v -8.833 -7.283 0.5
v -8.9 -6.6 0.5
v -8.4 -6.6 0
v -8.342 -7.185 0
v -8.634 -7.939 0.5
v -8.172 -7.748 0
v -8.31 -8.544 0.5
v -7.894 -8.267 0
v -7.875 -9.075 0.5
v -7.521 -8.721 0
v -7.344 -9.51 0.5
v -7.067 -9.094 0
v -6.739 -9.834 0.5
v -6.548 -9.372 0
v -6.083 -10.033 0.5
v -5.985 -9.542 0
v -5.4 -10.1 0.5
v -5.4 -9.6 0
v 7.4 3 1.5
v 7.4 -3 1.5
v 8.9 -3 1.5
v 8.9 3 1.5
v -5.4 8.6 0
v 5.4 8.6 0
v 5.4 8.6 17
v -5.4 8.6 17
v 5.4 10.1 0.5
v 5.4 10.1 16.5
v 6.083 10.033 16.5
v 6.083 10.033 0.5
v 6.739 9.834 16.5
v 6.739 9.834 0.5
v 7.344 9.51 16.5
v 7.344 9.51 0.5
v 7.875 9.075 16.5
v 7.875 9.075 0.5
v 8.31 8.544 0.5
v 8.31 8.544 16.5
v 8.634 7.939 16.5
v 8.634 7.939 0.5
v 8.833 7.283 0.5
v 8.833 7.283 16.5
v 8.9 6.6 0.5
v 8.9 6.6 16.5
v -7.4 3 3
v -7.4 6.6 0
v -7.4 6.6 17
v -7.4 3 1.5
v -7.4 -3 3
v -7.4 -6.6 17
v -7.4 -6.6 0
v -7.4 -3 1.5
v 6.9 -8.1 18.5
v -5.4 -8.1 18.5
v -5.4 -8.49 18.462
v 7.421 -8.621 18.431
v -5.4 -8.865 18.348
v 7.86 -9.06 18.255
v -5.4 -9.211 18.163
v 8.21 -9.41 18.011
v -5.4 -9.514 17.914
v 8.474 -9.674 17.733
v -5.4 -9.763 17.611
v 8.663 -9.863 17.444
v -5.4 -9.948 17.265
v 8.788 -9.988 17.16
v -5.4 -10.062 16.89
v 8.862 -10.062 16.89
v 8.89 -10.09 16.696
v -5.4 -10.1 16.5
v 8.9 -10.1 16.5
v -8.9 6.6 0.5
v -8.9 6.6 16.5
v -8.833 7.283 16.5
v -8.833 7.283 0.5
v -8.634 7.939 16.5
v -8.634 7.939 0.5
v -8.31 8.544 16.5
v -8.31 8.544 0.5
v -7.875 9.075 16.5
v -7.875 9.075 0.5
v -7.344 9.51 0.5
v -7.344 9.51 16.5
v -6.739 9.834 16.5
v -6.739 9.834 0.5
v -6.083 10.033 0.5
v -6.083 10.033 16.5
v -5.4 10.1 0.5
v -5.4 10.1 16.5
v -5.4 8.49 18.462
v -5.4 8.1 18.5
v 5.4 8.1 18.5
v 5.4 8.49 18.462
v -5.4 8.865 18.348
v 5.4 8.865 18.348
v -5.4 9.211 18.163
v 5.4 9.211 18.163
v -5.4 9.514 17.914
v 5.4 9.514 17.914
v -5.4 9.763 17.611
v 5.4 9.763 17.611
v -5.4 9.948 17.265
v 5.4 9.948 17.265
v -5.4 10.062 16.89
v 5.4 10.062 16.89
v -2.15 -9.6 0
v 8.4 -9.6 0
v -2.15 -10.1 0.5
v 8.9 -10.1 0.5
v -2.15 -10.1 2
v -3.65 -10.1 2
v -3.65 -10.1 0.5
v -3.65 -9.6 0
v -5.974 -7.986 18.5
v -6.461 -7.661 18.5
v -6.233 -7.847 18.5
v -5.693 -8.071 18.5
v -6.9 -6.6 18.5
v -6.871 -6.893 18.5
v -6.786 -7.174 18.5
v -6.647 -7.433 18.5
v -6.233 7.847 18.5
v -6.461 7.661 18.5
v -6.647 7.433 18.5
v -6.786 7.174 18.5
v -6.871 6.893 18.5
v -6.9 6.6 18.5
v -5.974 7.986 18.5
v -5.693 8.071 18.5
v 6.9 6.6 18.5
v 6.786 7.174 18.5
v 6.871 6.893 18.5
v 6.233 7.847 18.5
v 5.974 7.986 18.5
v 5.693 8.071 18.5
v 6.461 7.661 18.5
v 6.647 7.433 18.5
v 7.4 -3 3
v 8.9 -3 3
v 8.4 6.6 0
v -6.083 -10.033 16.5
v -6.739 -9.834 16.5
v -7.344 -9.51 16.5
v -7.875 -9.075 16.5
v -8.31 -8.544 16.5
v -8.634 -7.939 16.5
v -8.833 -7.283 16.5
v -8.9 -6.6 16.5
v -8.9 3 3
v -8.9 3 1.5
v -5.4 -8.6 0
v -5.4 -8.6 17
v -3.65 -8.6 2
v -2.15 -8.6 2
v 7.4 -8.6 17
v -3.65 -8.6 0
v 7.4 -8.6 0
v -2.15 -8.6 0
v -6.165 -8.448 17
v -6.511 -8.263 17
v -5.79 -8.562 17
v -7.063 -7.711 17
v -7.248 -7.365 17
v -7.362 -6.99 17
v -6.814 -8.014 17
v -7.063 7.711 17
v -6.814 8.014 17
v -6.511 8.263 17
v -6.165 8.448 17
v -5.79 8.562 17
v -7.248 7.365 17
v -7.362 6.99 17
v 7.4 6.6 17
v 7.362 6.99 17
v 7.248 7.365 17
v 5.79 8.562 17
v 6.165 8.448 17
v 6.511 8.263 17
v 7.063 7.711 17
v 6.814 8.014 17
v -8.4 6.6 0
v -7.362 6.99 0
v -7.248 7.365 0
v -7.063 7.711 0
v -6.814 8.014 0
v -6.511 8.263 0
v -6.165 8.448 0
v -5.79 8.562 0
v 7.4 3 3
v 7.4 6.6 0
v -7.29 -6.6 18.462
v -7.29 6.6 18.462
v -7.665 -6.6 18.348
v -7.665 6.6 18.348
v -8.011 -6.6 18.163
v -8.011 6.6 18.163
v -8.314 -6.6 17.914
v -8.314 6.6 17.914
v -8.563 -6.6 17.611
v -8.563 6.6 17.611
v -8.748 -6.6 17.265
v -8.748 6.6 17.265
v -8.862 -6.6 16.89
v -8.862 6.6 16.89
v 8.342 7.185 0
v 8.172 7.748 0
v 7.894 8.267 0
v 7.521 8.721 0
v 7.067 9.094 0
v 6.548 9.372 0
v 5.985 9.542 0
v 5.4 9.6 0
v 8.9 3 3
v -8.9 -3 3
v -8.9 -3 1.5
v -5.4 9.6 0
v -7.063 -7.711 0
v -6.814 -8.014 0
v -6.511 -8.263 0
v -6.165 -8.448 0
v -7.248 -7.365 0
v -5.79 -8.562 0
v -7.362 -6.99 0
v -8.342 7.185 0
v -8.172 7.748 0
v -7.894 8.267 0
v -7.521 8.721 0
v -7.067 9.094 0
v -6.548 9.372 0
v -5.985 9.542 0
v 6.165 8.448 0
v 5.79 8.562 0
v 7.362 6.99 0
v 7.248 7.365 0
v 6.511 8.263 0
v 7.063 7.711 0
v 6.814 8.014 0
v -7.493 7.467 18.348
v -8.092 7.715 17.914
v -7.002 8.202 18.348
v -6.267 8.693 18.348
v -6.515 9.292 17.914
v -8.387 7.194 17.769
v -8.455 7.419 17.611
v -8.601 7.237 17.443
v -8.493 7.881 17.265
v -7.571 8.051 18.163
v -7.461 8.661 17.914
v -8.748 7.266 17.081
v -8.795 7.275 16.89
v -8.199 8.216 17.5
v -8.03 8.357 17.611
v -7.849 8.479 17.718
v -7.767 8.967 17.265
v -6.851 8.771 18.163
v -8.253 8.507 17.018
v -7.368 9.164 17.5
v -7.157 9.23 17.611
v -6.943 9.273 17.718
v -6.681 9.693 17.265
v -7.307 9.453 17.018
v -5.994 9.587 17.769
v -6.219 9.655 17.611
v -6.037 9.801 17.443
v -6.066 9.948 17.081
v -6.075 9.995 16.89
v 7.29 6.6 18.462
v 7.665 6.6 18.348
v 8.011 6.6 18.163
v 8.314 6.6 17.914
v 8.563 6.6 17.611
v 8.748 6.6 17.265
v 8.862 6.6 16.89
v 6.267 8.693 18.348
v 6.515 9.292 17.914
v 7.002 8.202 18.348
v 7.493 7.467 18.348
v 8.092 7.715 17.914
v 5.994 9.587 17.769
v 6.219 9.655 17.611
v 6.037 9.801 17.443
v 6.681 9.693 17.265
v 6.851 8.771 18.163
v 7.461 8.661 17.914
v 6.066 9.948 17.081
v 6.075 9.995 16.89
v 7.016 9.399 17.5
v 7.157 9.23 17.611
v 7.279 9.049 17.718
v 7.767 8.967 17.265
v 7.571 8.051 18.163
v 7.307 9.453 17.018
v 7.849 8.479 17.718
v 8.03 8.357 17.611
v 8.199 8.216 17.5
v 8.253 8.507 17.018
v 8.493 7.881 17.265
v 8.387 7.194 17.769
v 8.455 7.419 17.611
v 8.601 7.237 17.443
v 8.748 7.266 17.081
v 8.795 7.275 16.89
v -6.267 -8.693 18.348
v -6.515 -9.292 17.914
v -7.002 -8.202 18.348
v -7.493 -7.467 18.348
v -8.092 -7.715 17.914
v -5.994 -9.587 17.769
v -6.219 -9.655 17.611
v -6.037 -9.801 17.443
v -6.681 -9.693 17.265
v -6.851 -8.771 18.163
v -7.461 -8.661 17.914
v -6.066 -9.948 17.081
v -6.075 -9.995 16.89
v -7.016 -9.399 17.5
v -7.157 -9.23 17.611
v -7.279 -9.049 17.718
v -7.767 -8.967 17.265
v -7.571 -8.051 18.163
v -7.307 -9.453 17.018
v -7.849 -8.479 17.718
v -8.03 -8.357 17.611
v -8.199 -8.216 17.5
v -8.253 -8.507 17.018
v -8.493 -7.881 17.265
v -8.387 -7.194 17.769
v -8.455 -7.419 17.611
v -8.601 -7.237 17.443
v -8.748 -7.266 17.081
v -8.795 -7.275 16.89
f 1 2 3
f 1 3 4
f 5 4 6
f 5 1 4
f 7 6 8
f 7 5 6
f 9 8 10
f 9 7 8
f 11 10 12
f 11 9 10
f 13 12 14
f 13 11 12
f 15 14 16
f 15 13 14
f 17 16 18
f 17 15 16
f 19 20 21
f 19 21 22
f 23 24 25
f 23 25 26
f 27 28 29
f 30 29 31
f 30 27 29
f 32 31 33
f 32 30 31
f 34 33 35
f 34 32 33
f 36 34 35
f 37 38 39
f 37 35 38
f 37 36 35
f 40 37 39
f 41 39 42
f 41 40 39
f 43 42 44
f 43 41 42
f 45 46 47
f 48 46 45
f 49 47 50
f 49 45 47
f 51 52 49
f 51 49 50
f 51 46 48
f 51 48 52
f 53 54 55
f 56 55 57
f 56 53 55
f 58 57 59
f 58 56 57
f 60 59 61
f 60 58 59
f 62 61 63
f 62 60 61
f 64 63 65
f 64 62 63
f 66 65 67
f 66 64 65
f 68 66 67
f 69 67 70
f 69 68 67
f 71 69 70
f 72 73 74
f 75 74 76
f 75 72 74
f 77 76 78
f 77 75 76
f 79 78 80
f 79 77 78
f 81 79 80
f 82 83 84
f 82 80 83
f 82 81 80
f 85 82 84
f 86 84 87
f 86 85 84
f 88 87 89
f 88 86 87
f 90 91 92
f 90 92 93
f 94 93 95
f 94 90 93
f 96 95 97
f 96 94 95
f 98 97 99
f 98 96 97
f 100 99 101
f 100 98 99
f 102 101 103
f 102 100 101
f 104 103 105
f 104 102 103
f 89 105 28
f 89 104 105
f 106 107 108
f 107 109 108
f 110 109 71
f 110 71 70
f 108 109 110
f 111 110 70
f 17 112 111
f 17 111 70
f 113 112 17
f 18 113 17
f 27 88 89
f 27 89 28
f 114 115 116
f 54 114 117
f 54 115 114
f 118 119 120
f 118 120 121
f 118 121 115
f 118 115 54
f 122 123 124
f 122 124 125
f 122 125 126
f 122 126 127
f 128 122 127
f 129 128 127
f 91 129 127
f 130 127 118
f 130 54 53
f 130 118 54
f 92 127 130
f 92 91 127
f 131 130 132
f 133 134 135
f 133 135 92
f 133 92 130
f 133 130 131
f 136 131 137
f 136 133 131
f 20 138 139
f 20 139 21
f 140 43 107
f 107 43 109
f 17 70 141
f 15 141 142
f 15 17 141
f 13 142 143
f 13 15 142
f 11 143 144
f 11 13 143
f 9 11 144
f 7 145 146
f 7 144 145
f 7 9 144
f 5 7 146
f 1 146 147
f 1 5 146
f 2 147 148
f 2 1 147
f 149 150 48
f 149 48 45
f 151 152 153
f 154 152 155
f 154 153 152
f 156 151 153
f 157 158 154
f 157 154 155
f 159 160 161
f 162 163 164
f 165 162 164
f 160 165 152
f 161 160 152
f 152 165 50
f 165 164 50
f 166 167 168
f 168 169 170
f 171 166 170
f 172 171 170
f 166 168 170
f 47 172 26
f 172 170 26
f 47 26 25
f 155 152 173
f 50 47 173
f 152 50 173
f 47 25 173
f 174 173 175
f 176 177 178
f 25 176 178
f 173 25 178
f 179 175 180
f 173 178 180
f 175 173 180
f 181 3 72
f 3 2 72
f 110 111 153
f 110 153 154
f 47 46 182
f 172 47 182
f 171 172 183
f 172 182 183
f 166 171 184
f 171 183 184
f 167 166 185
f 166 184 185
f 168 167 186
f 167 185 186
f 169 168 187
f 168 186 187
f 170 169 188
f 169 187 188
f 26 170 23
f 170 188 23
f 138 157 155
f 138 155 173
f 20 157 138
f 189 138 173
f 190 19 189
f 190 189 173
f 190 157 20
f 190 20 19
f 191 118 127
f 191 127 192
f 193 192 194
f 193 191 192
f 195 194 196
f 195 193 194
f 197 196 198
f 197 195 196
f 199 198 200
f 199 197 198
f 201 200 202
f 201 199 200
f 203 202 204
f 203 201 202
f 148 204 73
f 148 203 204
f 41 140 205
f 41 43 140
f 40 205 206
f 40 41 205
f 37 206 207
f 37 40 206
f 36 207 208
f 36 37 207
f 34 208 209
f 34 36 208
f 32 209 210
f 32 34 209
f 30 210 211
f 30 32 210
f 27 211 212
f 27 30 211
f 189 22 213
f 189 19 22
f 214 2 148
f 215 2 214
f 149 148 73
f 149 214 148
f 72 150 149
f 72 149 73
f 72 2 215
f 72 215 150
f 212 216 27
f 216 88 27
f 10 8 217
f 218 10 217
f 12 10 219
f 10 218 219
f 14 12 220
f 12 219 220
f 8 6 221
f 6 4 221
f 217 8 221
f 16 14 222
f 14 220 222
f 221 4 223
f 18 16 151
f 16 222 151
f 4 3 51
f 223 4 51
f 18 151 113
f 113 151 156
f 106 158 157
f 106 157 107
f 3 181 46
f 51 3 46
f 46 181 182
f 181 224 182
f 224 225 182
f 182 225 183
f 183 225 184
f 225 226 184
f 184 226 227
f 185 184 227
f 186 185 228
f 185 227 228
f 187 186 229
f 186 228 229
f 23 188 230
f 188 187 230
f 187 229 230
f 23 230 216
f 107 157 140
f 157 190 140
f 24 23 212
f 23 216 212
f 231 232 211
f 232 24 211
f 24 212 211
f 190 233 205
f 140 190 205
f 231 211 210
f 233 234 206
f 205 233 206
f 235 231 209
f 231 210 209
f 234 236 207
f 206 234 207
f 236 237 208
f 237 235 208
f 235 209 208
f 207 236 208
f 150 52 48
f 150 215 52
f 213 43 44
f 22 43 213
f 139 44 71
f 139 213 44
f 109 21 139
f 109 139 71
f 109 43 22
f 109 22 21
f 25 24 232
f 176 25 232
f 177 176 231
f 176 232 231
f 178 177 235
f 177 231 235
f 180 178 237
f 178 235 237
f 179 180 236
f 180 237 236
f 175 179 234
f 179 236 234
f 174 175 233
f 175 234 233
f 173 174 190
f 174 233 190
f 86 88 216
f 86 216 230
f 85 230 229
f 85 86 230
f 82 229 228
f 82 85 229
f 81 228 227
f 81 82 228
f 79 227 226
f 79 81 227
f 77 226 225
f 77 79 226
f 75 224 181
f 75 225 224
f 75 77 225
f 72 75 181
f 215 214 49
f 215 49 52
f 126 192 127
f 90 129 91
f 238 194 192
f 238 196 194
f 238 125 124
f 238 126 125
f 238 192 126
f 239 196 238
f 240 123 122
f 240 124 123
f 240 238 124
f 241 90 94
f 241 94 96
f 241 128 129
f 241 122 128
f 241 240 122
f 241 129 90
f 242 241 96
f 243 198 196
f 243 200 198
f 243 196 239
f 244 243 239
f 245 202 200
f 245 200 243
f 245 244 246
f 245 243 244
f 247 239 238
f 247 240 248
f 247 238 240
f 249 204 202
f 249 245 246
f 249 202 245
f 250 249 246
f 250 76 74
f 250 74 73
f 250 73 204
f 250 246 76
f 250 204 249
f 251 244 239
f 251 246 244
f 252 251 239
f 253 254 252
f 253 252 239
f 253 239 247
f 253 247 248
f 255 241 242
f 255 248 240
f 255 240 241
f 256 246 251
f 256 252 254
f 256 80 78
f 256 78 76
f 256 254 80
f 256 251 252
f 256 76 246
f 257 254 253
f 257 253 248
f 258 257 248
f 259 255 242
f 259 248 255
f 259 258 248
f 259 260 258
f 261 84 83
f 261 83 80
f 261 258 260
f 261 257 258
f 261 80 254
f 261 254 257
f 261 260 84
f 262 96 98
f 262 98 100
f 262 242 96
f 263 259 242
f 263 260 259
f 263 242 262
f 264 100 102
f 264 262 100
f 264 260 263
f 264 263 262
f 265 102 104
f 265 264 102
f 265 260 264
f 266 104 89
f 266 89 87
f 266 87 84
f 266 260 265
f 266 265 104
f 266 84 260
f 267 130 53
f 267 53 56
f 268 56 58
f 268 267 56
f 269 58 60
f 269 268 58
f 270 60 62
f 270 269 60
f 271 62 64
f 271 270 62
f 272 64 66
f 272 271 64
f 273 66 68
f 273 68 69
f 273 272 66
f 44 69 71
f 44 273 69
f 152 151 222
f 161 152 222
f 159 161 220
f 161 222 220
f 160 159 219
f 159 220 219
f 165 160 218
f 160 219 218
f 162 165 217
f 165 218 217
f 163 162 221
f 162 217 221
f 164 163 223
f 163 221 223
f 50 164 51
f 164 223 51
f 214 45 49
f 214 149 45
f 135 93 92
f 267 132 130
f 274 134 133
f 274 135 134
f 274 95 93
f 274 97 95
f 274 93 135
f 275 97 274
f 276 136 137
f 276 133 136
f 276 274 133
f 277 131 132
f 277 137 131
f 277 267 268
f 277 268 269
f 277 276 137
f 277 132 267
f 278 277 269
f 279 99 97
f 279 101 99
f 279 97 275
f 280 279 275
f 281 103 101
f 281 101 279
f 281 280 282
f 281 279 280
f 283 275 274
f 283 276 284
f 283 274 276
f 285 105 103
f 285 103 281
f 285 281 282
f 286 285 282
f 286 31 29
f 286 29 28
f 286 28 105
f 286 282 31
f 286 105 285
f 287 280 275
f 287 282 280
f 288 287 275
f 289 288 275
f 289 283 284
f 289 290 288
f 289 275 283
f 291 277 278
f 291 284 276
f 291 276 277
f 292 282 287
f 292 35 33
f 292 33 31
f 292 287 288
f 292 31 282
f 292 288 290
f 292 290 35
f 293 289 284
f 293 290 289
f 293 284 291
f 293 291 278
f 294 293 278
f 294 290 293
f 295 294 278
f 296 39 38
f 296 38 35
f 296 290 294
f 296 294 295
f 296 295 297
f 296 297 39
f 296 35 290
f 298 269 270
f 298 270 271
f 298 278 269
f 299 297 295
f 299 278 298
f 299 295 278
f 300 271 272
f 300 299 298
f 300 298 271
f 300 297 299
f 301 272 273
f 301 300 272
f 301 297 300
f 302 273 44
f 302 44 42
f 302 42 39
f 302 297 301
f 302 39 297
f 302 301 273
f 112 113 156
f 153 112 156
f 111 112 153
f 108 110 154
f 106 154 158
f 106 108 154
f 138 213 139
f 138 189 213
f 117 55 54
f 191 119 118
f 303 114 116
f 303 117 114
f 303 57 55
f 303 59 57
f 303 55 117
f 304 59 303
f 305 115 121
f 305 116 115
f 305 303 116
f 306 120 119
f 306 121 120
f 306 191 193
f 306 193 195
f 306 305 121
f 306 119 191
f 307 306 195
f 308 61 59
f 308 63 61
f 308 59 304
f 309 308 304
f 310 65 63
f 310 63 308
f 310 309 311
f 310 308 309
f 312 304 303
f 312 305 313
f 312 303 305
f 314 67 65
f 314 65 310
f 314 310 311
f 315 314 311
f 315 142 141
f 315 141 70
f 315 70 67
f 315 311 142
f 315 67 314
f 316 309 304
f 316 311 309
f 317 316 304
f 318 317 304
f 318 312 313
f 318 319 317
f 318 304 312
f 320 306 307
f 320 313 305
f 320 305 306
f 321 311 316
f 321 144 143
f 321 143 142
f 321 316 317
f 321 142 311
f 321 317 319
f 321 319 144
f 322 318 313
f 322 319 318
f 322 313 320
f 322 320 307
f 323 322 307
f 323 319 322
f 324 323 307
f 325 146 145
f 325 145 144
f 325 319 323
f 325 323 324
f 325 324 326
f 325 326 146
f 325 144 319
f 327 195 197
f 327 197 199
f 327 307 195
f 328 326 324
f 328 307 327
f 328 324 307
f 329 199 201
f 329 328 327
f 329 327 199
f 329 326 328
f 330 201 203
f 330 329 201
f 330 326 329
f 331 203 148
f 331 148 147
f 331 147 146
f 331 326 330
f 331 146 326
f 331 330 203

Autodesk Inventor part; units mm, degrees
ref_plane "YZ Plane" through (0, 0, 0) normal (1, 0, 0) x (0, 1, 0)
ref_plane "XZ Plane" through (0, 0, 0) normal (0, 1, 0) x (-1, 0, 0)
ref_plane "XY Plane" through (0, 0, 0) normal (0, 0, 1) x (1, 0, 0)
sketch "스케치1" plane through (0, 0, 0) normal (0, 0, 1) x (1, 0, 0)
  line L0 (-5.4, -8.6) -> (7.4, -8.6)
  line L1 (7.4, -8.6) -> (7.4, 6.6)
  line L2 (5.4, 8.6) -> (-5.4, 8.6)
  line L3 (-7.4, 6.6) -> (-7.4, -6.6)
  line L4 (-7.4, -8.6) -> (7.4, 8.6) construction
  line L5 (7.4, -8.6) -> (-7.4, 8.6) construction
  arc A0 (-5.4, 8.6) -> (-7.4, 6.6) centre (-5.4, 6.6) ccw
  arc A1 (7.4, 6.6) -> (5.4, 8.6) centre (5.4, 6.6) ccw
  arc A2 (-7.4, -6.6) -> (-5.4, -8.6) centre (-5.4, -6.6) ccw
  line L6 (-5.4, 10.1) -> (5.4, 10.1)
  arc A3 (8.9, 6.6) -> (5.4, 10.1) centre (5.4, 6.6) ccw
  line L7 (8.9, 6.6) -> (8.9, -10.1)
  line L8 (8.9, -10.1) -> (-5.4, -10.1)
  arc A4 (-8.9, -6.6) -> (-5.4, -10.1) centre (-5.4, -6.6) ccw
  line L9 (-8.9, -6.6) -> (-8.9, 6.6)
  arc A5 (-5.4, 10.1) -> (-8.9, 6.6) centre (-5.4, 6.6) ccw
  point P0 (0, 0)
  dimension "d0" = 17.2
  dimension "d1" = 14.8
  dimension "d2" = 2
  dimension "d3" = 1.5
extrude "돌출1" add sketch "스케치1" along normal blind 17
sketch "스케치2" plane through (0, 0, 17) normal (0, 0, 1) x (1, 0, 0)
  line L0 (-5.4, -10.1) -> (8.9, -10.1) projected
  line L1 (8.9, -10.1) -> (8.9, 6.6) projected
  arc A0 (8.9, 6.6) -> (5.4, 10.1) centre (5.4, 6.6) ccw projected
  line L2 (5.4, 10.1) -> (-5.4, 10.1) projected
  arc A1 (-5.4, 10.1) -> (-8.9, 6.6) centre (-5.4, 6.6) ccw projected
  line L3 (-8.9, 6.6) -> (-8.9, -6.6) projected
  arc A2 (-8.9, -6.6) -> (-5.4, -10.1) centre (-5.4, -6.6) ccw projected
  point P0 (0, 0)
extrude "돌출2" add sketch "스케치2" along normal blind 1.5
sketch "스케치3" plane through (-8.9, -6.6, 0) normal (-1, 0, 0) x (0, 0, 1)
  line L0 (0, 13.2) -> (0, 0) projected
  line L1 (3, 3.6) -> (1.5, 3.6)
  line L2 (1.5, 3.6) -> (1.5, 9.6)
  line L3 (1.5, 9.6) -> (3, 9.6)
  line L4 (3, 9.6) -> (3, 3.6)
  point P0 (0, 6.6)
  point P1 (0, 6.6)
  point P2 (1.5, 6.6)
  dimension "d8" = 6
  dimension "d9" = 1.5
  dimension "d10" = 1.5
extrude "돌출3" cut sketch "스케치3" against normal through all
fillet "모깎기1" radius 2 7 edges at (-7.8749, -9.0749, 18.5) (1.75, -10.1, 18.5) (-7.8749, 9.0749, 18.5) (0, 10.1, 18.5) (7.8749, 9.0749, 18.5) (8.9, -1.75, 18.5) (-8.9, 0, 18.5)
chamfer "모따기1" distance 0.5 angle 45 7 edges at (1.75, -10.1, 0) (-7.8749, -9.0749, 0) (-8.9, 0, 0) (-7.8749, 9.0749, 0) (0, 10.1, 0) (7.8749, 9.0749, 0) (8.9, -1.75, 0)
sketch "스케치4" plane through (-5.4, -10.1, 16.5) normal (0, -1, 0) x (1, 0, 0)
  line L0 (1.75, -14.5) -> (3.25, -14.5)
  line L1 (3.25, -14.5) -> (3.25, -16.5)
  line L2 (3.25, -16.5) -> (1.75, -16.5)
  line L3 (1.75, -16.5) -> (1.75, -14.5)
  line L4 (-3.5, -16) -> (-3.5, 0) projected
  line L5 (0, -16.5) -> (13.8, -16.5) projected
  point P0 (5.4, -16.5)
  point P1 (2.5, -14.5)
  point P2 (2.5, -14.5)
  dimension "d17" = 1.5
  dimension "d18" = 2
  dimension "d19" = 6
extrude "돌출4" cut sketch "스케치4" against normal up to surface (1.5 mm away)
properties part number "_3D 인쇄"
